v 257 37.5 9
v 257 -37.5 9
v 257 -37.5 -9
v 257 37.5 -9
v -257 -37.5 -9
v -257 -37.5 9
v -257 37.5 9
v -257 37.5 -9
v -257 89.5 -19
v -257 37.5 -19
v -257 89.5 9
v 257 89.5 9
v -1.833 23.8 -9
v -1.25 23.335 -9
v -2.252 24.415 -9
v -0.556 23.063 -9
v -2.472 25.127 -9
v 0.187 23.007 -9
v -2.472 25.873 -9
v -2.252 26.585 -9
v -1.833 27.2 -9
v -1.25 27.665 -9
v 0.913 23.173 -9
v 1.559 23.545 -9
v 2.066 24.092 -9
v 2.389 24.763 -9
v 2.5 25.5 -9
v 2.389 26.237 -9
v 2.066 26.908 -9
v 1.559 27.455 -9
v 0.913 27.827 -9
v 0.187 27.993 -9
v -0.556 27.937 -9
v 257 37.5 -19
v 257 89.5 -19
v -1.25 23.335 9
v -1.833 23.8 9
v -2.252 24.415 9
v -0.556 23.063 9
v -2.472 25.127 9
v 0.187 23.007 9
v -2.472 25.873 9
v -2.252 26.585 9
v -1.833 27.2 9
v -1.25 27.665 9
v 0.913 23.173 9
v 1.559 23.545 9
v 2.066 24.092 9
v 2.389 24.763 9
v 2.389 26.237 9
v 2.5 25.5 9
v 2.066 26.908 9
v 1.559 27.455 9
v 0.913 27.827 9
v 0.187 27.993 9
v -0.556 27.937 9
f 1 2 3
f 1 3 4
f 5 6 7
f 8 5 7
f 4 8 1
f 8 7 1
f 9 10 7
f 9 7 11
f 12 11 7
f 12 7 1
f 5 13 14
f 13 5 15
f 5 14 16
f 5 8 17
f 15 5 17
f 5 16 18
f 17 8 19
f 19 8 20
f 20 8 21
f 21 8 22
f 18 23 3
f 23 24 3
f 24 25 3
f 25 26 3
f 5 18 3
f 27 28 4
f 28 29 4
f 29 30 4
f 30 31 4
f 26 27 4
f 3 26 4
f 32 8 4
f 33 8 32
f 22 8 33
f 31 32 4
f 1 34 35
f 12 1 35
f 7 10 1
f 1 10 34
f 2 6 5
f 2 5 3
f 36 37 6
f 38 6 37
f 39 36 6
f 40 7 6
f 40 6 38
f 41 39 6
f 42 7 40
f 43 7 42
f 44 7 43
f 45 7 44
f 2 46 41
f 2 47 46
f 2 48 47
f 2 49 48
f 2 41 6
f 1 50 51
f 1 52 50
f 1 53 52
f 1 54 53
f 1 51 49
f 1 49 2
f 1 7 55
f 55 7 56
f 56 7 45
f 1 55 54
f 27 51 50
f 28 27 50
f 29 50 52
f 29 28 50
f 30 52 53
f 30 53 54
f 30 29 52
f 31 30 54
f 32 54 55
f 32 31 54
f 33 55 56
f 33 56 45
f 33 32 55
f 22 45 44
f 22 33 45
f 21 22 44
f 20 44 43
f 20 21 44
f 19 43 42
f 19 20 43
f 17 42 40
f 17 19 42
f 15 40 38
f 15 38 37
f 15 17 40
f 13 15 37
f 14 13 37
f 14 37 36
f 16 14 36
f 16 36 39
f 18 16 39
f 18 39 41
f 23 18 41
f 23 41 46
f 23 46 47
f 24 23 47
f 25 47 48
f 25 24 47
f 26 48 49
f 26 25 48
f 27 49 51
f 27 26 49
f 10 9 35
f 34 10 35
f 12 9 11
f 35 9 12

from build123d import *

# Parameters (mm, degrees)
SKETCH1_3_W         = 514
SKETCH1_3_H         = 52
BOSS_EXTRUDE2_DEPTH = 9
BOSS_EXTRUDE3_START = -19
SKETCH1_4_W         = 514
SKETCH1_4_H         = 52
BOSS_EXTRUDE3_DEPTH = 10
SKETCH1_W           = 514
SKETCH1_H           = 75
SKETCH1_R           = 2.5
BOSS_EXTRUDE1_DEPTH = 9


with BuildPart() as part:
    # Sketch1<3> → Boss-Extrude2 (new, symmetric)
    with BuildSketch(Plane.XY):
        with Locations((0, 63.5)):
            Rectangle(SKETCH1_3_W, SKETCH1_3_H)
    extrude(amount=BOSS_EXTRUDE2_DEPTH, both=True)

    # Sketch1<4> → Boss-Extrude3 (add)
    with BuildSketch(Plane.XY.offset(BOSS_EXTRUDE3_START)):
        with Locations((0, 63.5)):
            Rectangle(SKETCH1_4_W, SKETCH1_4_H)
        with Locations((0, 63.5)):
            Rectangle(SKETCH1_4_W, SKETCH1_4_H)
    extrude(amount=BOSS_EXTRUDE3_DEPTH)


with BuildPart() as body_2:
    # Sketch1 → Boss-Extrude1 (new, symmetric)
    with BuildSketch(Plane.XY):
        Rectangle(SKETCH1_W, SKETCH1_H)
        with Locations((0, 25.5)):
            Circle(SKETCH1_R, mode=Mode.SUBTRACT)
    extrude(amount=BOSS_EXTRUDE1_DEPTH, both=True)


solid = Compound([part.part, body_2.part])
